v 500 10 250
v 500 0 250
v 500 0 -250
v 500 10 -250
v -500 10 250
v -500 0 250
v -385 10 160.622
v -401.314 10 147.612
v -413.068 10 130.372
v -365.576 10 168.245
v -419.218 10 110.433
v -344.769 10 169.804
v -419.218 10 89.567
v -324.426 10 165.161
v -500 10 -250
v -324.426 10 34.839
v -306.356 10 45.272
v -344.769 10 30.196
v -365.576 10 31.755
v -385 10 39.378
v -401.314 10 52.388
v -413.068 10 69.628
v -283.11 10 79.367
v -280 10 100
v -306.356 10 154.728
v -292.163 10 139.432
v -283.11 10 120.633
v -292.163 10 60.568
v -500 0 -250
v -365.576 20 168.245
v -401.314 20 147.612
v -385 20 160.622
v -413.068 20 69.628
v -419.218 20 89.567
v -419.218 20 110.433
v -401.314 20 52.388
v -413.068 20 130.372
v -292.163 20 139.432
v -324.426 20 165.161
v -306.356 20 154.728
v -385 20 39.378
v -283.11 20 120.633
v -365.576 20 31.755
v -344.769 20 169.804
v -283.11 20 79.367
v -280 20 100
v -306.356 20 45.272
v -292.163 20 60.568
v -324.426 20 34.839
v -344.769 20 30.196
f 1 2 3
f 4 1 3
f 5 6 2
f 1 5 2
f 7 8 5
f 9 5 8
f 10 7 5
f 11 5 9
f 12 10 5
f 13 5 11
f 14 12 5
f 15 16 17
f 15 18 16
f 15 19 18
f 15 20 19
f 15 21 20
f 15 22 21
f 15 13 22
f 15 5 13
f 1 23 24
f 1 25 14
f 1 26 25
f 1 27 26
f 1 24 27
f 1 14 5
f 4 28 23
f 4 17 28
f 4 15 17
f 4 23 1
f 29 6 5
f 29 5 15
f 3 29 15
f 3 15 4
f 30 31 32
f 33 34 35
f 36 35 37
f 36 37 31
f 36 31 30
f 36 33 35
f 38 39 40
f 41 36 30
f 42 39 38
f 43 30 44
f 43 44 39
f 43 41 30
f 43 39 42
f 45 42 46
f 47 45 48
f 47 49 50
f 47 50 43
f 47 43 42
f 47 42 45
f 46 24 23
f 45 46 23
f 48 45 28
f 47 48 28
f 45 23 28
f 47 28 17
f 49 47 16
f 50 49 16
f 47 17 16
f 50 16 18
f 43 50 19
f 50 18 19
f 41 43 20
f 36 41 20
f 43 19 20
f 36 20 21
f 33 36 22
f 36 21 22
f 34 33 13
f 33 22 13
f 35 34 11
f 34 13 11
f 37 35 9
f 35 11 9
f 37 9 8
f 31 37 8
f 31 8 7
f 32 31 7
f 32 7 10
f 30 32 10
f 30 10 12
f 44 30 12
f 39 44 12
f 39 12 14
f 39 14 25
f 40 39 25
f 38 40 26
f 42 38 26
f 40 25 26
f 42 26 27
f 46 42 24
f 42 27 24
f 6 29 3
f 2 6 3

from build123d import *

# Parameters (mm, degrees)
SKETCH1_W           = 1000
SKETCH1_H           = 500
BOSS_EXTRUDE1_DEPTH = 10
SKETCH2_R           = 70
BOSS_EXTRUDE2_DEPTH = 10


with BuildPart() as part:
    # Sketch1 → Boss-Extrude1 (new body)
    with BuildSketch(Plane(origin=(0, 0, 0), x_dir=(1, 0, 0), z_dir=(0, 1, 0))):
        Rectangle(SKETCH1_W, SKETCH1_H)
    extrude(amount=BOSS_EXTRUDE1_DEPTH)

    # Sketch2 → Boss-Extrude2 (add)
    with BuildSketch(Plane(origin=(0, 10, 0), x_dir=(1, 0, 0), z_dir=(0, 1, 0))):
        with Locations((-350, -100)):
            Circle(SKETCH2_R)
    extrude(amount=BOSS_EXTRUDE2_DEPTH)


solid = part.part
